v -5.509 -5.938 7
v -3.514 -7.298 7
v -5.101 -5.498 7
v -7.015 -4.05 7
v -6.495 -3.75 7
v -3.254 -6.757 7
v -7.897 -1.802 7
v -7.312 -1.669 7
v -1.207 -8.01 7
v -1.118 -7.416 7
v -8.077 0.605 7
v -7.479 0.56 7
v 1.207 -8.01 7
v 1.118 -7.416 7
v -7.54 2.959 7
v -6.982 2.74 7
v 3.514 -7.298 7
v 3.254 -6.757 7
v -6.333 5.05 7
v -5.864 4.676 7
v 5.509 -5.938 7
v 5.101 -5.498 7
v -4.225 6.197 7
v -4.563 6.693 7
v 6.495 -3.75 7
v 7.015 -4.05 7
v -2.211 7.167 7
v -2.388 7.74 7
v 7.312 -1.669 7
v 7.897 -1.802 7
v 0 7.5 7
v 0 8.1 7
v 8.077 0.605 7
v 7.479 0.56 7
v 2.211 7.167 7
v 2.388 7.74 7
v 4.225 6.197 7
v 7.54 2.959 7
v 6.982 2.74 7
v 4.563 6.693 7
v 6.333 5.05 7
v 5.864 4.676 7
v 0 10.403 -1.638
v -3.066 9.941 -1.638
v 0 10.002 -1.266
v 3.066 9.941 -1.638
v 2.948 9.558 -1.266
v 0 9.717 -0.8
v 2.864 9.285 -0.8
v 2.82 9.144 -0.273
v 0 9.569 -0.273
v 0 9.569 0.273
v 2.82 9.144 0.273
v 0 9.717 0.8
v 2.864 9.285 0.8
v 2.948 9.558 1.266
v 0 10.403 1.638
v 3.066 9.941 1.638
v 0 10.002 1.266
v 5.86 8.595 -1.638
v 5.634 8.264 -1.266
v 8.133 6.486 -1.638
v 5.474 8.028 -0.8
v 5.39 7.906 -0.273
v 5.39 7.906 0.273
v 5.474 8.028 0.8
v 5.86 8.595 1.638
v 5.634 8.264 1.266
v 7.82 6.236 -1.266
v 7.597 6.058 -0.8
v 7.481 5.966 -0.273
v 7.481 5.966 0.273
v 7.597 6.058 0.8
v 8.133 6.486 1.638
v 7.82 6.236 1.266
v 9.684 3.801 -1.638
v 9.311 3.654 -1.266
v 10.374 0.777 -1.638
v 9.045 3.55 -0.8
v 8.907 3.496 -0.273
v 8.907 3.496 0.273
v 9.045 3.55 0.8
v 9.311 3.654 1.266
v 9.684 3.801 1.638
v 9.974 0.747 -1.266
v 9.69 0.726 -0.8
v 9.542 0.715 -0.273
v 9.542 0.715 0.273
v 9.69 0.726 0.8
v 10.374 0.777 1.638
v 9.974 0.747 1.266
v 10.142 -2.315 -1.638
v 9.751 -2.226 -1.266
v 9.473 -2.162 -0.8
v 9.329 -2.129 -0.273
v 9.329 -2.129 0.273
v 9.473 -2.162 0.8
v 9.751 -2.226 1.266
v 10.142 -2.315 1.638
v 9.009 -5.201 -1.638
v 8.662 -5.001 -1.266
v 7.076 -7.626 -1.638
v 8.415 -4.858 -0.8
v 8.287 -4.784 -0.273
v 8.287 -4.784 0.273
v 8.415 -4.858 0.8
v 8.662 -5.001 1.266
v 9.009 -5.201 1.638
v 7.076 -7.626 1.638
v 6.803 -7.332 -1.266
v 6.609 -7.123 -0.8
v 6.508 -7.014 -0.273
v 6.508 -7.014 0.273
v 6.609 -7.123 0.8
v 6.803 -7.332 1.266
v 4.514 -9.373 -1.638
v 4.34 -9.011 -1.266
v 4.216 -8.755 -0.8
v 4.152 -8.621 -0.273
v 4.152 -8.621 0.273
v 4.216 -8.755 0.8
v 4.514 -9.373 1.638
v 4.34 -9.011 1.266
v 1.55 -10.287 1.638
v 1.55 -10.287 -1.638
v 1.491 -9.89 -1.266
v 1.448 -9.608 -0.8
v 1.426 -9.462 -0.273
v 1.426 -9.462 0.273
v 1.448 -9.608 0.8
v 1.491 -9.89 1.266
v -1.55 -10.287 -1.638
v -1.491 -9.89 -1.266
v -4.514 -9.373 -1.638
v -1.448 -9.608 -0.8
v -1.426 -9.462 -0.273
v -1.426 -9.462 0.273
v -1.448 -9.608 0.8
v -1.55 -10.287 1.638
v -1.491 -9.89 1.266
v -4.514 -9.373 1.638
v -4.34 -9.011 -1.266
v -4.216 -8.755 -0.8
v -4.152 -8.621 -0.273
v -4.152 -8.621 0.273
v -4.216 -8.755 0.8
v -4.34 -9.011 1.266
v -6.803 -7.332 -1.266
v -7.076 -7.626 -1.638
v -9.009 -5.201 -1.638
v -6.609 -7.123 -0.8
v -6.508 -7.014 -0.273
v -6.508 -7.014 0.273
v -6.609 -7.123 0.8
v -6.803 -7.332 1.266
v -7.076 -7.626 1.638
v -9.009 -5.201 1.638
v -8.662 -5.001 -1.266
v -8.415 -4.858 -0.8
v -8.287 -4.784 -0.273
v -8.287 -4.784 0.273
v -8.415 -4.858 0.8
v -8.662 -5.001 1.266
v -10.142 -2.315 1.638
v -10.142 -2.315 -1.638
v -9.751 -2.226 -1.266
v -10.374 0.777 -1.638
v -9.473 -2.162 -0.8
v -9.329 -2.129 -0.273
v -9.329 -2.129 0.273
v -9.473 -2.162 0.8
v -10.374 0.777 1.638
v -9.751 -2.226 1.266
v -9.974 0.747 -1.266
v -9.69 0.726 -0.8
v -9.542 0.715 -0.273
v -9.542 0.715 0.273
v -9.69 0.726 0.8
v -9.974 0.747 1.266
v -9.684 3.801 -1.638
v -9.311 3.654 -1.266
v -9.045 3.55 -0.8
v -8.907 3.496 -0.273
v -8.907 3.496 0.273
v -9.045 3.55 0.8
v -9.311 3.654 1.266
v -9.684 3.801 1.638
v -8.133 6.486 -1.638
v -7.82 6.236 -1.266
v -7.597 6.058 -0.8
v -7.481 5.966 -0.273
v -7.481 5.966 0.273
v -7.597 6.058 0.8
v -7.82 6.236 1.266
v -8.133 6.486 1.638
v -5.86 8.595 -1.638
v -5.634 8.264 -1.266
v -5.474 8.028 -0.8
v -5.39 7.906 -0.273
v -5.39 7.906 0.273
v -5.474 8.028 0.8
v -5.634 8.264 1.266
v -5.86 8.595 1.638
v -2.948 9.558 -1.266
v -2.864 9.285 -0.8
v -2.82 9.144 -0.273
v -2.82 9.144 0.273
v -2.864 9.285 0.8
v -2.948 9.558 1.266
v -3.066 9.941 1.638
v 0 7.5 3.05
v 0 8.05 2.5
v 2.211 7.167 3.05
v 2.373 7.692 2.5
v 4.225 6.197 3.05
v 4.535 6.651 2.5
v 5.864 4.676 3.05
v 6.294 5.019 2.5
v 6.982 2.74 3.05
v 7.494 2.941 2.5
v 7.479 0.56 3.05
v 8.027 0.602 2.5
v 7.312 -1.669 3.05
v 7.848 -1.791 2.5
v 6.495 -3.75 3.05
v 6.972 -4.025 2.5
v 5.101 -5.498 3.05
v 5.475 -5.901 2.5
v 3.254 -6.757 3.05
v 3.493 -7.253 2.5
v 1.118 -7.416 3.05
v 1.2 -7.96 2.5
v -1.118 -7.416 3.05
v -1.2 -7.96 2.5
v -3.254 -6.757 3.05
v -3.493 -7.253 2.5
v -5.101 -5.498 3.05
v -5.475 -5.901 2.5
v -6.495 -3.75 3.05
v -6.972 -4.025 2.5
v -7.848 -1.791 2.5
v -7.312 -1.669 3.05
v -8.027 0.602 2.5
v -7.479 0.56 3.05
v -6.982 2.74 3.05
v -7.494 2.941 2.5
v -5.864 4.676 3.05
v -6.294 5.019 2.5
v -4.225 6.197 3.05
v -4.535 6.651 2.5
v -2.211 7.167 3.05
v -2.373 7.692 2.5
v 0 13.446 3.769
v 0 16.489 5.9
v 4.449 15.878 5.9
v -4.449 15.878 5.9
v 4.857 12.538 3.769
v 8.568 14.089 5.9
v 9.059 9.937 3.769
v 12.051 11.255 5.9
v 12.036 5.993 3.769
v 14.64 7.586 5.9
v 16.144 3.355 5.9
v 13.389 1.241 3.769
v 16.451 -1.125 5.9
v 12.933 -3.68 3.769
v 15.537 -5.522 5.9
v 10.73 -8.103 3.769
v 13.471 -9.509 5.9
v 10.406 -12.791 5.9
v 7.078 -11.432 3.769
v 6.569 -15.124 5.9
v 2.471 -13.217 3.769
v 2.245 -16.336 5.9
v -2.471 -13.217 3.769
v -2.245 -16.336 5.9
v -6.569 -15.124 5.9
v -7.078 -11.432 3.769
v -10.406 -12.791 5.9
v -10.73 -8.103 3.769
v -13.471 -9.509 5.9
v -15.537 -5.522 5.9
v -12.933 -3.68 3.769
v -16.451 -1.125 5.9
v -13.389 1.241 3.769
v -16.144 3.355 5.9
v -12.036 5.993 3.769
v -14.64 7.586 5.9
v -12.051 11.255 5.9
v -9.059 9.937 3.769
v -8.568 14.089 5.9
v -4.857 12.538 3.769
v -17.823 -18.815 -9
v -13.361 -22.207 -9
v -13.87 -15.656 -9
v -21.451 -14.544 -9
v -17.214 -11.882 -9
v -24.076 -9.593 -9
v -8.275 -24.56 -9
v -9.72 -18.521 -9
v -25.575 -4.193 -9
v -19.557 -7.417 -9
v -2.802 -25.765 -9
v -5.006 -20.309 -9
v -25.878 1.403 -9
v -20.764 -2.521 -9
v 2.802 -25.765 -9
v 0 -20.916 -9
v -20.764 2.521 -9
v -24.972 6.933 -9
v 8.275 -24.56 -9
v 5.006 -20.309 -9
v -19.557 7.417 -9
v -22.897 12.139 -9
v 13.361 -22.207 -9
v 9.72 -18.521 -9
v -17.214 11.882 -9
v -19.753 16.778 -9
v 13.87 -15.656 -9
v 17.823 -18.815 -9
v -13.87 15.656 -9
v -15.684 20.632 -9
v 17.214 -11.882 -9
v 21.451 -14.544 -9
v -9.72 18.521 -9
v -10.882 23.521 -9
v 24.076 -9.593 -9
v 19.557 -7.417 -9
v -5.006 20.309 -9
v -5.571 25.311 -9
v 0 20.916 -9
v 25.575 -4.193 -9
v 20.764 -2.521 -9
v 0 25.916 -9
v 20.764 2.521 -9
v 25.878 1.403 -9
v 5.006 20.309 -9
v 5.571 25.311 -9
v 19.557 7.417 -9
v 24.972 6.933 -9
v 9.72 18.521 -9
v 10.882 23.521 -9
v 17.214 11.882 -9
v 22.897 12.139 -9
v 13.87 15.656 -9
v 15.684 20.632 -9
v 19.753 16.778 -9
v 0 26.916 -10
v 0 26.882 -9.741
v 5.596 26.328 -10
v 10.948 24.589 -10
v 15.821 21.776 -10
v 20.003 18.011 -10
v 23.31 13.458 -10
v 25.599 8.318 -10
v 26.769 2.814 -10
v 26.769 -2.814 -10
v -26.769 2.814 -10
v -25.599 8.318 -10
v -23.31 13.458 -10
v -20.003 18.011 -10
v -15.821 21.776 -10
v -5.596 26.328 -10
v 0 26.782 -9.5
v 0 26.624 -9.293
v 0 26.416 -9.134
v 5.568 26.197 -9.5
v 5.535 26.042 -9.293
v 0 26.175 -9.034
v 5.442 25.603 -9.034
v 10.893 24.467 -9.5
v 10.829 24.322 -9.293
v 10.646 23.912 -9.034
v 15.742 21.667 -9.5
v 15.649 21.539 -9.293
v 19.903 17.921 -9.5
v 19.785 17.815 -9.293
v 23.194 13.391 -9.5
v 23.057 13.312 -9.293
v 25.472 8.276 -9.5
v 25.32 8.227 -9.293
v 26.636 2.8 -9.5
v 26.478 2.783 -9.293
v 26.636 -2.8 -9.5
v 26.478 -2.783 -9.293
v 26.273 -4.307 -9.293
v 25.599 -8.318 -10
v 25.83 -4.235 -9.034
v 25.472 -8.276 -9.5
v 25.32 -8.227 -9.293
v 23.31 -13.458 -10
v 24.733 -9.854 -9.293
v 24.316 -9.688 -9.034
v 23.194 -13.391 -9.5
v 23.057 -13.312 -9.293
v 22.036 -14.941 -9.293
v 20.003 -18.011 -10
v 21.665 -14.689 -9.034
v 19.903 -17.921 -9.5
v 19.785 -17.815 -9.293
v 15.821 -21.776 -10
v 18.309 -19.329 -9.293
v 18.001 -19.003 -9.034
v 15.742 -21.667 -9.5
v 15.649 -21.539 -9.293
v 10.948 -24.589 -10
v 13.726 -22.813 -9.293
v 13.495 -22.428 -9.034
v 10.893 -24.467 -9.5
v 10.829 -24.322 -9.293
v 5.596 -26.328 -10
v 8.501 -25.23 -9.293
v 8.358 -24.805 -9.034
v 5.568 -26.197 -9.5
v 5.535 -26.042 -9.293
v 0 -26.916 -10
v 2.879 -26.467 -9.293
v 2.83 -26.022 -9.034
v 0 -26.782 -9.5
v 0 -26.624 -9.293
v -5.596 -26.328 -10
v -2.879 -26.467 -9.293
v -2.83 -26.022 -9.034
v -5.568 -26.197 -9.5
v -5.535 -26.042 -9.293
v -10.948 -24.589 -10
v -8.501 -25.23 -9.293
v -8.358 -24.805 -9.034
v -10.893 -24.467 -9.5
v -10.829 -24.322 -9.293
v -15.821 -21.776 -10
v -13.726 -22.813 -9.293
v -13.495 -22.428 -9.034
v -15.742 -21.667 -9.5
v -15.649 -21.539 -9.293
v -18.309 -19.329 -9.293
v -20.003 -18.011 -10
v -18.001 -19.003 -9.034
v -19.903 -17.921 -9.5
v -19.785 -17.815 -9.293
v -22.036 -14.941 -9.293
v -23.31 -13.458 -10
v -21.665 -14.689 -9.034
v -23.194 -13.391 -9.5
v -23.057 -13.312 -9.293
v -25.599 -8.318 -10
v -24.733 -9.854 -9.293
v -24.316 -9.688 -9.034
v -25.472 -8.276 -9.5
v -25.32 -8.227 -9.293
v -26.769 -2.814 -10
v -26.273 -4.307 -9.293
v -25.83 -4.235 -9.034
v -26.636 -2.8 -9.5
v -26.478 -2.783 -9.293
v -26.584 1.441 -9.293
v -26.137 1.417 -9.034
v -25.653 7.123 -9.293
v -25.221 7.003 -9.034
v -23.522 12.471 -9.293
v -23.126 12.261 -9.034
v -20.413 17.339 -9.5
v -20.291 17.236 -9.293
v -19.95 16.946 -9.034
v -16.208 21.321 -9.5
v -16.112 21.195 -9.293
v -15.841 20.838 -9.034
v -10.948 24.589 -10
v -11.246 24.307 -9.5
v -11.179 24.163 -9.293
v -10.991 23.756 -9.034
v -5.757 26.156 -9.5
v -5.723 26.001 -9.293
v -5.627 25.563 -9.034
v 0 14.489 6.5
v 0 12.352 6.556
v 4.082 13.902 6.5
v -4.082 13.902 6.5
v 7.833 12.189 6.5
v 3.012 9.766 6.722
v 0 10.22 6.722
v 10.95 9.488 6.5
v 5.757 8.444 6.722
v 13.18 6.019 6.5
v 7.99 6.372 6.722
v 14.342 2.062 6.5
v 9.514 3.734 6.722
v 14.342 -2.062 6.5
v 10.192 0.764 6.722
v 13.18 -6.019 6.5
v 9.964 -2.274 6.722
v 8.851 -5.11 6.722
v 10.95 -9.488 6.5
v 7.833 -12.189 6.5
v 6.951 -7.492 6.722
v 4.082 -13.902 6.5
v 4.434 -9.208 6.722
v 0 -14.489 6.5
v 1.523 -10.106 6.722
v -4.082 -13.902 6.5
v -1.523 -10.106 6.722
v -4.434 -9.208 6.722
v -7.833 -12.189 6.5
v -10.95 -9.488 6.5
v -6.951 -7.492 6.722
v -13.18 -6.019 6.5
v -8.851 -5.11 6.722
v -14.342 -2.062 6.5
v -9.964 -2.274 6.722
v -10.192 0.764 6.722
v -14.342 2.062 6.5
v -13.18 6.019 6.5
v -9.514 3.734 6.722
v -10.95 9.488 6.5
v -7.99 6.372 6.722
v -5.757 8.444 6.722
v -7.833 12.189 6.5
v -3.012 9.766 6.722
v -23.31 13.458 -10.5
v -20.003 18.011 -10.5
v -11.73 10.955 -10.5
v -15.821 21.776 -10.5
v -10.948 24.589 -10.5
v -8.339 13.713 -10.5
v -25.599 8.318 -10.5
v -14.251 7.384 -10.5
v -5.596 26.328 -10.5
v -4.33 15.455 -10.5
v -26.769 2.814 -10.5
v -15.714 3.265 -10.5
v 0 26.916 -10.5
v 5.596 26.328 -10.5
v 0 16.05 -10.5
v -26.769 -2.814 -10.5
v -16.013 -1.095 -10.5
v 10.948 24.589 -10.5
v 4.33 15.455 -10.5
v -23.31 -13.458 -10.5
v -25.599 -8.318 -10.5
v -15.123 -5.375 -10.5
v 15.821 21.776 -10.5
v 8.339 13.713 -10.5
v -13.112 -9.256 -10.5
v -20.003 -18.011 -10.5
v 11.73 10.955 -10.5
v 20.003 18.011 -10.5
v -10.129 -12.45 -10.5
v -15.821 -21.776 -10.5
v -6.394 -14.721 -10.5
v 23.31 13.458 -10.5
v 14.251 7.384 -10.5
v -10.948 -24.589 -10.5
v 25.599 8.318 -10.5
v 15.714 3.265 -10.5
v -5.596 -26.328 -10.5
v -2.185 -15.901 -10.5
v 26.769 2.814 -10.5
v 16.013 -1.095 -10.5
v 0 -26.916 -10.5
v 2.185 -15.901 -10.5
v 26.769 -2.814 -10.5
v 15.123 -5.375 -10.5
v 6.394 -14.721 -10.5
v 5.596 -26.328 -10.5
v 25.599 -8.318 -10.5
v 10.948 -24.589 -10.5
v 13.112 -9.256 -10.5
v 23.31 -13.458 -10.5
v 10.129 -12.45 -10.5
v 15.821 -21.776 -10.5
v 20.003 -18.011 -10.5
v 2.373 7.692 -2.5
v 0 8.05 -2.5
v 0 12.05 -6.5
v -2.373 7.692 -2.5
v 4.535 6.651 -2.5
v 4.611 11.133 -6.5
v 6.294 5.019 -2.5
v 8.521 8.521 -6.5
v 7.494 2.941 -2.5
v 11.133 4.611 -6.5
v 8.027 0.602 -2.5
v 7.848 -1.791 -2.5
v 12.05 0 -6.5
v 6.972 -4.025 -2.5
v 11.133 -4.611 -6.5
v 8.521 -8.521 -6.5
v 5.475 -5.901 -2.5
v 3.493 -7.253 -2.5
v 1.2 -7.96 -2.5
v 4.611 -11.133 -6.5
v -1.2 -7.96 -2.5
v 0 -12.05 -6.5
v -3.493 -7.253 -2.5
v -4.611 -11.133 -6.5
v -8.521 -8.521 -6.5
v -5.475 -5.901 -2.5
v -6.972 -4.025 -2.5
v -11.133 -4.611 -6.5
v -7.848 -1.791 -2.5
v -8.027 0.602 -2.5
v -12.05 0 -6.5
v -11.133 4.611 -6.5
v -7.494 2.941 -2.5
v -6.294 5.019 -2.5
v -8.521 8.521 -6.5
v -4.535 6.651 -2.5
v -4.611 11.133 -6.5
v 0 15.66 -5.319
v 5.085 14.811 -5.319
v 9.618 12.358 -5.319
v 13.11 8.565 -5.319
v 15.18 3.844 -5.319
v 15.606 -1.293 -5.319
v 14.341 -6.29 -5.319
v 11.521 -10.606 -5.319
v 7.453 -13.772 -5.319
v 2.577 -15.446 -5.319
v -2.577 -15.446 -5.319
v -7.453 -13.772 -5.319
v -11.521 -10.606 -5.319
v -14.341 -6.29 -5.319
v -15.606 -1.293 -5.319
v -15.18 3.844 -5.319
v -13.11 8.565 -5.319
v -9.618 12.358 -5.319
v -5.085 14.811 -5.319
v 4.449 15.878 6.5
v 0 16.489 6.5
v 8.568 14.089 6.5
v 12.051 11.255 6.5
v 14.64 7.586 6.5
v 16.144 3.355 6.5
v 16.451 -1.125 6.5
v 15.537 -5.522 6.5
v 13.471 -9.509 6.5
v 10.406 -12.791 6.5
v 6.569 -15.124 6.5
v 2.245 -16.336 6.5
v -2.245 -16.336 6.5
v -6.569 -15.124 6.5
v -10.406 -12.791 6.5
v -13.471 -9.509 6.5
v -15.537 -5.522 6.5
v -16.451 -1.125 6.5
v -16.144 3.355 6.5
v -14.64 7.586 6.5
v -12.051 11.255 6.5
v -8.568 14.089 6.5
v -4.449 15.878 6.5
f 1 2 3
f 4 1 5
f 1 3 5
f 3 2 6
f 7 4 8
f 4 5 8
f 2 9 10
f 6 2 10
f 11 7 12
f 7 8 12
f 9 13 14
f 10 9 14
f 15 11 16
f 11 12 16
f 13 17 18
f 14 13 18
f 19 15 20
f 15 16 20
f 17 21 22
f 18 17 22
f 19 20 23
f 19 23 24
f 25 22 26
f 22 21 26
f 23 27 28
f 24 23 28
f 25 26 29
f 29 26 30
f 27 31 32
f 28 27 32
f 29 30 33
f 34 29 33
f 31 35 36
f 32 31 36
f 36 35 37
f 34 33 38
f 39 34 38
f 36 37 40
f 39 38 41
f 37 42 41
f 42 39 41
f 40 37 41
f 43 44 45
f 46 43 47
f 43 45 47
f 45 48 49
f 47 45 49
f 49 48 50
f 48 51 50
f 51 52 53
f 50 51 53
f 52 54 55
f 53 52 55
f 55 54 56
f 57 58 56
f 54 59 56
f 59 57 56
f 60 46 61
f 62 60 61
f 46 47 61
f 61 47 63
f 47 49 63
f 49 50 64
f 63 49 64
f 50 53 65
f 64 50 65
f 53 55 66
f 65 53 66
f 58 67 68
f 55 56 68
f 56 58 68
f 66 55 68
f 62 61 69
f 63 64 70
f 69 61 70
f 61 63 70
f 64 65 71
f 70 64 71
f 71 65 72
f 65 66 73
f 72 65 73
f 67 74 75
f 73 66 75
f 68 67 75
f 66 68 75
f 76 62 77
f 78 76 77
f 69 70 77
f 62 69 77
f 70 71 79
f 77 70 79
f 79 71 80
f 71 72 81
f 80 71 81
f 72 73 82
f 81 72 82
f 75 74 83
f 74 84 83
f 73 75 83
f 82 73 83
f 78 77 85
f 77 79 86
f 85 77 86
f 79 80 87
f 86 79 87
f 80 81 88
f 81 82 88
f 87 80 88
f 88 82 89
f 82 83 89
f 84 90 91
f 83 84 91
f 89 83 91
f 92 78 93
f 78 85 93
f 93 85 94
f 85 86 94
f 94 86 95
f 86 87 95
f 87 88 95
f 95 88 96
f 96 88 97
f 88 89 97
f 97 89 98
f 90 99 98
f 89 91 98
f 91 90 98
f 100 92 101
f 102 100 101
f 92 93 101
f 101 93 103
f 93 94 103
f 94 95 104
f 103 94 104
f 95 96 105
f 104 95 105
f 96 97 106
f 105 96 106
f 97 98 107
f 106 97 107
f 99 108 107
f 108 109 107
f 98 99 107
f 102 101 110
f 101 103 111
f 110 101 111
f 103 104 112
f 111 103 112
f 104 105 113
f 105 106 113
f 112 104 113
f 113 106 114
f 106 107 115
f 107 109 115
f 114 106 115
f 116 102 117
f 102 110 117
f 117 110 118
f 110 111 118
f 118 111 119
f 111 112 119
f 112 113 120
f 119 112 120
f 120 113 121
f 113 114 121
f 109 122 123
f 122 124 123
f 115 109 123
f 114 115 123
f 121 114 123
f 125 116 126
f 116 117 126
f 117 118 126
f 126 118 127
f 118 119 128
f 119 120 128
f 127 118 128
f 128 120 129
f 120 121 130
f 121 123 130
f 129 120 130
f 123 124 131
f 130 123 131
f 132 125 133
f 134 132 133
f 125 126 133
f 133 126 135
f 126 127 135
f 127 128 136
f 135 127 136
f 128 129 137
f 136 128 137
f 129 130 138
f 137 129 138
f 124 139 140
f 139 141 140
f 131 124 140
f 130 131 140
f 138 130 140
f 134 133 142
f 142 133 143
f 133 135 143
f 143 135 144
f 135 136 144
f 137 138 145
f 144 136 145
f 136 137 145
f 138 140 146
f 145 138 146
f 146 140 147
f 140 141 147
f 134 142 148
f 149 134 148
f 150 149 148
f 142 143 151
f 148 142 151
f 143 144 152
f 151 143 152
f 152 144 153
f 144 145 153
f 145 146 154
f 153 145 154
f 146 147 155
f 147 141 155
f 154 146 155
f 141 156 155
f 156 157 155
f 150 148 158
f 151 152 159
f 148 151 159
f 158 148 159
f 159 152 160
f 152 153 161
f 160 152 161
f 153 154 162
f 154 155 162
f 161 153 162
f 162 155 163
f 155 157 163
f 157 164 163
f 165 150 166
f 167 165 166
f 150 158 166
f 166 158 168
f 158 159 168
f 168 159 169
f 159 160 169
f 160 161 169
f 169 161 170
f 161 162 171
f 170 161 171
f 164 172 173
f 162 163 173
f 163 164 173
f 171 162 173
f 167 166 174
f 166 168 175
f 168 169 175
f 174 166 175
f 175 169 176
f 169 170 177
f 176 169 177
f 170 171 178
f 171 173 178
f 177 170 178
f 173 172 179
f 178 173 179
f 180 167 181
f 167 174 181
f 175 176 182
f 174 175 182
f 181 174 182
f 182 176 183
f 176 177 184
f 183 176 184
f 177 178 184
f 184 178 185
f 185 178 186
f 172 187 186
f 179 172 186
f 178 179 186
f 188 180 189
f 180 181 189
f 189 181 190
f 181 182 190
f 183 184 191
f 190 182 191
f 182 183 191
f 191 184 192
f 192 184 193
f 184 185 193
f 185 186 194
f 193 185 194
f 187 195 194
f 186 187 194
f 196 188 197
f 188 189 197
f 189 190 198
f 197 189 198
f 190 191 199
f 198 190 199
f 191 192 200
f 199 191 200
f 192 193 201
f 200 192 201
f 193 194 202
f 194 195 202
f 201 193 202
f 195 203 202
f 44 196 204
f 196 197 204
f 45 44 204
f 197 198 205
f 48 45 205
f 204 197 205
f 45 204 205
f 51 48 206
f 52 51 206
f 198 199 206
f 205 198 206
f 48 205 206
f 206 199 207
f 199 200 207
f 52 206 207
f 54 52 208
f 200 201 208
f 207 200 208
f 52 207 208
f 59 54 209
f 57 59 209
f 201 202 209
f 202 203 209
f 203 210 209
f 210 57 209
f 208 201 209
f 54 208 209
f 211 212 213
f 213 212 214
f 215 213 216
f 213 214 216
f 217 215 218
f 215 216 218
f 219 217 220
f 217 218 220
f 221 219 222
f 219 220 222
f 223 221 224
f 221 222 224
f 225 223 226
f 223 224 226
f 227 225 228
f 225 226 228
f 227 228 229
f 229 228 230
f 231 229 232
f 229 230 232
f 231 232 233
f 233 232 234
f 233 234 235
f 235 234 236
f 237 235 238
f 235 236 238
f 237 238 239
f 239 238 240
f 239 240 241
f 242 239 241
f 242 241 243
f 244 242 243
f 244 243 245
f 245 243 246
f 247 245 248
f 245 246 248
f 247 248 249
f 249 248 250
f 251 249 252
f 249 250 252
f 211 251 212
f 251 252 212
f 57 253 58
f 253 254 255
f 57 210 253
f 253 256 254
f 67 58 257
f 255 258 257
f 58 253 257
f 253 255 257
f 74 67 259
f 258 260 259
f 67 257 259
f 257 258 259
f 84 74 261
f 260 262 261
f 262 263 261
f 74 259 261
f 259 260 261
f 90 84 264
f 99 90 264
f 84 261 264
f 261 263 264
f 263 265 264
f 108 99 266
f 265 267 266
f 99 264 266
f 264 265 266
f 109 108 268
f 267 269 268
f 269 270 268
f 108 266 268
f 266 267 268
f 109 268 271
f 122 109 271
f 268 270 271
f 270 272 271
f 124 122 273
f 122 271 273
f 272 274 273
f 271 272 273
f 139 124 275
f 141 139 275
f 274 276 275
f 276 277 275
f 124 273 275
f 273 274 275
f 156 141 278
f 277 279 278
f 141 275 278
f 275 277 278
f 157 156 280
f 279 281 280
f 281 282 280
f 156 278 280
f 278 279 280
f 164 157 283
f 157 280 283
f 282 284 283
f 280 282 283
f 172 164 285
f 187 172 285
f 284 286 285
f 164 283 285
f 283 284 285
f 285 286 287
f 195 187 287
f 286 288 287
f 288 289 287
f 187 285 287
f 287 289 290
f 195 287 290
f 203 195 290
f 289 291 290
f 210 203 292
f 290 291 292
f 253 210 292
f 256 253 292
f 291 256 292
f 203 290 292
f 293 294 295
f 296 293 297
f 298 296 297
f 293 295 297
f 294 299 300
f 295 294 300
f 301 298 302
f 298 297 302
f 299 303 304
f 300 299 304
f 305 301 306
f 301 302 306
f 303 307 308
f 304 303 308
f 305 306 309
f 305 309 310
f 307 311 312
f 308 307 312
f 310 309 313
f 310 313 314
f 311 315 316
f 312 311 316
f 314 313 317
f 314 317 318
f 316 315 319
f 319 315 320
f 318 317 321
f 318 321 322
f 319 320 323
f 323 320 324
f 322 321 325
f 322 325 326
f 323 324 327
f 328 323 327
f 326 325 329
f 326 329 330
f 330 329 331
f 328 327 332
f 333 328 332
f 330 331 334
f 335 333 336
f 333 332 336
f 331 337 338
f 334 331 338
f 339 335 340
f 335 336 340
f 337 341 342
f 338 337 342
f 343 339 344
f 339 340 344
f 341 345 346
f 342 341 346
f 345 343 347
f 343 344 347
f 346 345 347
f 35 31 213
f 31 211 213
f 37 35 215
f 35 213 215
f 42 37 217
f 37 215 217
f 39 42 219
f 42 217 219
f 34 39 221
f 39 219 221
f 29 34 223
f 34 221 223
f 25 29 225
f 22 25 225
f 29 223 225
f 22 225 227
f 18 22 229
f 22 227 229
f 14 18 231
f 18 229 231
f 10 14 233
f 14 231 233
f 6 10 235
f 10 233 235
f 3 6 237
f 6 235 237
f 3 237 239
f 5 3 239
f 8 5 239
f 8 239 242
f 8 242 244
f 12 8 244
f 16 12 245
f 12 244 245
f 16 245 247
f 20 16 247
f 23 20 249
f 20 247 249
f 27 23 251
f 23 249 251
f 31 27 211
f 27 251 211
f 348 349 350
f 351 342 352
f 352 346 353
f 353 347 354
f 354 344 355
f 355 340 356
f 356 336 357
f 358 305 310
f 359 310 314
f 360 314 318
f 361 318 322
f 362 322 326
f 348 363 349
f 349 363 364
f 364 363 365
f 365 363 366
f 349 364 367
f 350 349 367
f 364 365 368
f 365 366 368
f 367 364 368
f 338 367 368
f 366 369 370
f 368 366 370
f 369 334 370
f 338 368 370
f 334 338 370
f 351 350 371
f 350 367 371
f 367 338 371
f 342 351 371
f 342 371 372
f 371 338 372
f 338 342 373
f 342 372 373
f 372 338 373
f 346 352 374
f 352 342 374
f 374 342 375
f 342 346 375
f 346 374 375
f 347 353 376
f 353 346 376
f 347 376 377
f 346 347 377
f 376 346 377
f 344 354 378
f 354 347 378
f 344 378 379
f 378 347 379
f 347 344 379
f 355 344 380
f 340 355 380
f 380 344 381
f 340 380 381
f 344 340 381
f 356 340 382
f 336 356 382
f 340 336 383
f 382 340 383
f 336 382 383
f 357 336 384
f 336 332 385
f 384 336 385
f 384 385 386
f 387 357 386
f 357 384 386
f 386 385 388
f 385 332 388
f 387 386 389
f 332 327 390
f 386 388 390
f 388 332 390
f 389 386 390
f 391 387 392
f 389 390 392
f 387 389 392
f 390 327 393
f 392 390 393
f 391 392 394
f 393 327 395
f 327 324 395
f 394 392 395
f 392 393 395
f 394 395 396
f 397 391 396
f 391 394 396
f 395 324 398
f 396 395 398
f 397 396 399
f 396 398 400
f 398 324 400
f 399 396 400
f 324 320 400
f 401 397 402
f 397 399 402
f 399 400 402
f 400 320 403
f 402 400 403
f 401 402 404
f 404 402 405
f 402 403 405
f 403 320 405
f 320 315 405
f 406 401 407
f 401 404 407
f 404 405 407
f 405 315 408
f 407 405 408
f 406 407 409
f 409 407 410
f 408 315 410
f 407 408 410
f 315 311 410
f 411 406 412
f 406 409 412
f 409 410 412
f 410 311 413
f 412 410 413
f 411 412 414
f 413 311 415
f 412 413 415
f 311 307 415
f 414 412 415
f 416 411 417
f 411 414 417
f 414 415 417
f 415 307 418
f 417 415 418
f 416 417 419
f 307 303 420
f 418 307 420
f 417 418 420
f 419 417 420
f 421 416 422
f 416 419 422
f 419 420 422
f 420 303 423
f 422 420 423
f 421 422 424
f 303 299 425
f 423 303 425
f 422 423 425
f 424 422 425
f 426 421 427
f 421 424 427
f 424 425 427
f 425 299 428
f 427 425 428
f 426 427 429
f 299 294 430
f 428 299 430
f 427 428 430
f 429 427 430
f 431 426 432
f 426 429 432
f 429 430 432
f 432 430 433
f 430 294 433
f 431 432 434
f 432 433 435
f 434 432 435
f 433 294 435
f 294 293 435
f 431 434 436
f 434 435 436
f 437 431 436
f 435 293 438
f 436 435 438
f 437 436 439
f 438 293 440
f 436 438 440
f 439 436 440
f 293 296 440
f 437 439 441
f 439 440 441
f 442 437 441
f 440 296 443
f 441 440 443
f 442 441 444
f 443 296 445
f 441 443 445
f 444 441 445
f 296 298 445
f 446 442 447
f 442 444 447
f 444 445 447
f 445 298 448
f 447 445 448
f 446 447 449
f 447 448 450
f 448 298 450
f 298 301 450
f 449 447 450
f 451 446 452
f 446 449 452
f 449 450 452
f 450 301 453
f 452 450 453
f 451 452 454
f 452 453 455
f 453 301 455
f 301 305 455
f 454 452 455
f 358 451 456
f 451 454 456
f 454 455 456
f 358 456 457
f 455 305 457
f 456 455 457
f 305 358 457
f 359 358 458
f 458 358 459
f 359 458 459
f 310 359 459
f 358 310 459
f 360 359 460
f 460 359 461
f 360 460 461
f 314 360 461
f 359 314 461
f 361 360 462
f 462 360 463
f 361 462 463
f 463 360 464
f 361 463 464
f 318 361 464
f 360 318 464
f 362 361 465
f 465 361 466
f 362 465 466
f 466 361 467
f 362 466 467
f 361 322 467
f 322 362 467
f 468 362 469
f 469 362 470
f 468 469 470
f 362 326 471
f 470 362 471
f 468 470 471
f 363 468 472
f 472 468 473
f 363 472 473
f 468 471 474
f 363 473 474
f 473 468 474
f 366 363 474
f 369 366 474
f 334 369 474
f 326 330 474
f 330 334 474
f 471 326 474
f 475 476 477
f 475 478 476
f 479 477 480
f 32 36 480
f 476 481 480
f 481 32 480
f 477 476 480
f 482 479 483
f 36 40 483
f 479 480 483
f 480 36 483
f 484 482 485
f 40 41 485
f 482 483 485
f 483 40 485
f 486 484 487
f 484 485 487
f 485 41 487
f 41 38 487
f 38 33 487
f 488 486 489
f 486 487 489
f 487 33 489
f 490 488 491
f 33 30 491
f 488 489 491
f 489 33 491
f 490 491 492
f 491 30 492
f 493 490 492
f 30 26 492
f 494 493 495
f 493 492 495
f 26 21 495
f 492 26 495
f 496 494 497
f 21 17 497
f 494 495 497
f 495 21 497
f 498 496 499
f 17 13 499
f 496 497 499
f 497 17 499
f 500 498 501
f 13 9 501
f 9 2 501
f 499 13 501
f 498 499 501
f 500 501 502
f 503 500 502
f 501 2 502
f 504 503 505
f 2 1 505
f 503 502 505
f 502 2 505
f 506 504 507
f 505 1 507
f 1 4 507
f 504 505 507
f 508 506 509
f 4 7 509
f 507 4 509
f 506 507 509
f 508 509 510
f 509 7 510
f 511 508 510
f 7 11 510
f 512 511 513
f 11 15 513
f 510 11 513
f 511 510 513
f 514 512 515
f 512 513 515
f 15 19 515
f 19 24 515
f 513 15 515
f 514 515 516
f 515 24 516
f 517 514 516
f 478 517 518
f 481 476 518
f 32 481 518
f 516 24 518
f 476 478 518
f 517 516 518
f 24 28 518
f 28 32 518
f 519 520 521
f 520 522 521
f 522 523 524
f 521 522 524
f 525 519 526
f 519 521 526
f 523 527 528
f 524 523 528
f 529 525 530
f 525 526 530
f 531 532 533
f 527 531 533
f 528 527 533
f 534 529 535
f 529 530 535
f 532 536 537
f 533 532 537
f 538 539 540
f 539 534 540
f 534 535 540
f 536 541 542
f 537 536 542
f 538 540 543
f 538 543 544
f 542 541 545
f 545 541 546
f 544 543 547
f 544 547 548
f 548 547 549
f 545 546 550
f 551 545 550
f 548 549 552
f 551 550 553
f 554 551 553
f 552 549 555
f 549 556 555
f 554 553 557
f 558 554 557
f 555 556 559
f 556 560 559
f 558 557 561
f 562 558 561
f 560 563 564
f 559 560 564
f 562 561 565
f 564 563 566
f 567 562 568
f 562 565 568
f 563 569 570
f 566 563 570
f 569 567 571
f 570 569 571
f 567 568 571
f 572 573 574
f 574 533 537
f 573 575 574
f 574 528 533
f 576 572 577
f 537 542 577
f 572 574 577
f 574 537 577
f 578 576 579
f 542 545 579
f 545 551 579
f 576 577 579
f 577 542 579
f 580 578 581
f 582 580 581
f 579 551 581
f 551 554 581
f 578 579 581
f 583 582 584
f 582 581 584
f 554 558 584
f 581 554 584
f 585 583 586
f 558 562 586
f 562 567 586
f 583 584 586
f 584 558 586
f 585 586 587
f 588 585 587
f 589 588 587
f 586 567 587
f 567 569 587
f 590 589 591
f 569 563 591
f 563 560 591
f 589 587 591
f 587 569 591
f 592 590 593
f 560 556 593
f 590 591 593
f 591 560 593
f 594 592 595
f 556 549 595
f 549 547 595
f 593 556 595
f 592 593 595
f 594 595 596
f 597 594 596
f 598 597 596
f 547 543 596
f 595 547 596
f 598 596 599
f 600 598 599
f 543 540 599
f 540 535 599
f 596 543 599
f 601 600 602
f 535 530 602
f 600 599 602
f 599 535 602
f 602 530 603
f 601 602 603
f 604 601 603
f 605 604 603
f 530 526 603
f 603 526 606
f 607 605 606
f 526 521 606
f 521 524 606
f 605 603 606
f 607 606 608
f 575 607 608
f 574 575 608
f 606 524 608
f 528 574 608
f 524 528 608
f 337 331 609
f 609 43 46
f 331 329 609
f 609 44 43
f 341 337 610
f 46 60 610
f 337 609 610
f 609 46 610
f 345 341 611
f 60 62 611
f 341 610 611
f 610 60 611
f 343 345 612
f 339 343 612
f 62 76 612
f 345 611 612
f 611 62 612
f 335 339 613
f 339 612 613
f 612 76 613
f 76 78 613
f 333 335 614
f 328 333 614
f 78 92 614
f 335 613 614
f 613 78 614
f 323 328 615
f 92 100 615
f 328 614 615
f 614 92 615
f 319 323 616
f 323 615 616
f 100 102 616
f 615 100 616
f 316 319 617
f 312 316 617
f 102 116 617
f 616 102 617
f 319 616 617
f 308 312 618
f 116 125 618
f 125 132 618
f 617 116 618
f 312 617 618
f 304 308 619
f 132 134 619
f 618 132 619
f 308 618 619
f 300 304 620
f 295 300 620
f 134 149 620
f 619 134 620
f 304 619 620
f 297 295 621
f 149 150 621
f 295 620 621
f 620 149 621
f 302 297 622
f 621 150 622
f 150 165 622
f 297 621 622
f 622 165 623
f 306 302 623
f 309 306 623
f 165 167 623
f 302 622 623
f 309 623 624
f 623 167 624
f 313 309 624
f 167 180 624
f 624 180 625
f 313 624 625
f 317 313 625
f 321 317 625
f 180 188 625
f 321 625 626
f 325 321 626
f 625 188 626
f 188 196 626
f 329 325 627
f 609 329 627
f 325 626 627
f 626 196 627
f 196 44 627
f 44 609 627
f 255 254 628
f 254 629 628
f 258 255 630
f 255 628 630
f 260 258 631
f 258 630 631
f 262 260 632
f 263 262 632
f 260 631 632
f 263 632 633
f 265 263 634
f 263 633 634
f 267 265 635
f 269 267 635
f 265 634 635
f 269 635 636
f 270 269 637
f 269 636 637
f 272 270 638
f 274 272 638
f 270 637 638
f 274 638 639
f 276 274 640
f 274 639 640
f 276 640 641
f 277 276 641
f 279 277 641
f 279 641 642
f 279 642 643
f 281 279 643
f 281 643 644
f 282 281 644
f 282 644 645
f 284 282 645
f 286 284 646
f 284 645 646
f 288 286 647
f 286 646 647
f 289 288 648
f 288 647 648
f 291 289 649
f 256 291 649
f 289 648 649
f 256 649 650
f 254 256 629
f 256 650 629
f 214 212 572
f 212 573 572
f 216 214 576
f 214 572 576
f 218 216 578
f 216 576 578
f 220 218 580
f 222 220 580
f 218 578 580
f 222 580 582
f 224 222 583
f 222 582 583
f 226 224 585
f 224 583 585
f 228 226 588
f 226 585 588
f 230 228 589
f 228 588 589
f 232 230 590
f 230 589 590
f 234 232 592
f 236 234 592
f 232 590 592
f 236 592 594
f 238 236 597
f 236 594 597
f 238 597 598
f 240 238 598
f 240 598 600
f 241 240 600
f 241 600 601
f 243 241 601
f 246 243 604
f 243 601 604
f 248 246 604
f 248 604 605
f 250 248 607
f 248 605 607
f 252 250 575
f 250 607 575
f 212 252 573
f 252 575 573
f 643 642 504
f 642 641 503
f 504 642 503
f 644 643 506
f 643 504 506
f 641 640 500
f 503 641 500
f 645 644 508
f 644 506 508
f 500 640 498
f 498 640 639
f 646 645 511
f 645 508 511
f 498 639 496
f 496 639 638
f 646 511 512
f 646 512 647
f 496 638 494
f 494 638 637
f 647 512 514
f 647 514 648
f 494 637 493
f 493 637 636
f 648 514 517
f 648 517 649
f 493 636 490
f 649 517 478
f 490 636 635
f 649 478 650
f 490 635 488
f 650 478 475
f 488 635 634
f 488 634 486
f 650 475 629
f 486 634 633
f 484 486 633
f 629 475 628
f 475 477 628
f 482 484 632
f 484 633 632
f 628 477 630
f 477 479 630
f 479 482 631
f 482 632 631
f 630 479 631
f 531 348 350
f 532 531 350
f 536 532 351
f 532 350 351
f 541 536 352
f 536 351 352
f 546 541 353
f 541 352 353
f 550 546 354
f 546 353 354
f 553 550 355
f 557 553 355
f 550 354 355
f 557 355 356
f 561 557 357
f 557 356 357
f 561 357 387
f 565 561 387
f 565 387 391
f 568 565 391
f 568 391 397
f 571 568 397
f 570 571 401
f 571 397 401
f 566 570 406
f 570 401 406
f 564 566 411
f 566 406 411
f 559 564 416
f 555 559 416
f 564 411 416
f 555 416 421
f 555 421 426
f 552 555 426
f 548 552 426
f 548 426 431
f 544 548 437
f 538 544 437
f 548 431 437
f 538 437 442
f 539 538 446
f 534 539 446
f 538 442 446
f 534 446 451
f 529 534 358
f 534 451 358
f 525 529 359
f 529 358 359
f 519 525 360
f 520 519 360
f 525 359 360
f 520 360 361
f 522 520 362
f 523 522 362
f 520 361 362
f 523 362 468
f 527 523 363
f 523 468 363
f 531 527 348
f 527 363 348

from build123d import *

# Parameters (mm, degrees)
FILLET1_R = 1


with BuildPart() as part:
    # Sketch1 → Revolve1 (revolve)
    with BuildSketch(Plane(origin=(0, 0, 0), x_dir=(0, 0, -1), z_dir=(1, 0, 0))):
        with BuildLine():
            Line((-2.5, 8.05), (2.5, 8.05))
            Line((2.5, 8.05), (10.5, 16.05))
            Line((10.5, 16.05), (10.5, 26.916438469))
            Line((10.5, 26.916438469), (9, 26.916438469))
            Line((9, 26.916438469), (9, 20.916438469))
            Line((9, 20.916438469), (1.638304089, 10.402847127))
            ThreePointArc((1.638304089, 10.402847127), (0, 9.55), (-1.638304089, 10.402847127))
            Line((-1.638304089, 10.402847127), (-5.9, 16.489179649))
            Line((-5.9, 16.489179649), (-6.5, 16.489179649))
            Line((-6.5, 16.489179649), (-6.5, 14.489179649))
            ThreePointArc((-6.5, 14.489179649), (-6.625190798, 11.284822592), (-7, 8.1))
            Line((-7, 8.1), (-7, 7.5))
            Line((-7, 7.5), (-3.05, 7.5))
            Line((-3.05, 7.5), (-2.5, 8.05))
        make_face()
    revolve(axis=Axis((0, 0, 162.721569491), (0, 0, -1)))

    # Fillet1
    fillet1_edges = [part.edges().sort_by_distance(p)[0] for p in [
        (0, -26.916438469, -9),
    ]]
    fillet(fillet1_edges, radius=FILLET1_R)


solid = part.part
